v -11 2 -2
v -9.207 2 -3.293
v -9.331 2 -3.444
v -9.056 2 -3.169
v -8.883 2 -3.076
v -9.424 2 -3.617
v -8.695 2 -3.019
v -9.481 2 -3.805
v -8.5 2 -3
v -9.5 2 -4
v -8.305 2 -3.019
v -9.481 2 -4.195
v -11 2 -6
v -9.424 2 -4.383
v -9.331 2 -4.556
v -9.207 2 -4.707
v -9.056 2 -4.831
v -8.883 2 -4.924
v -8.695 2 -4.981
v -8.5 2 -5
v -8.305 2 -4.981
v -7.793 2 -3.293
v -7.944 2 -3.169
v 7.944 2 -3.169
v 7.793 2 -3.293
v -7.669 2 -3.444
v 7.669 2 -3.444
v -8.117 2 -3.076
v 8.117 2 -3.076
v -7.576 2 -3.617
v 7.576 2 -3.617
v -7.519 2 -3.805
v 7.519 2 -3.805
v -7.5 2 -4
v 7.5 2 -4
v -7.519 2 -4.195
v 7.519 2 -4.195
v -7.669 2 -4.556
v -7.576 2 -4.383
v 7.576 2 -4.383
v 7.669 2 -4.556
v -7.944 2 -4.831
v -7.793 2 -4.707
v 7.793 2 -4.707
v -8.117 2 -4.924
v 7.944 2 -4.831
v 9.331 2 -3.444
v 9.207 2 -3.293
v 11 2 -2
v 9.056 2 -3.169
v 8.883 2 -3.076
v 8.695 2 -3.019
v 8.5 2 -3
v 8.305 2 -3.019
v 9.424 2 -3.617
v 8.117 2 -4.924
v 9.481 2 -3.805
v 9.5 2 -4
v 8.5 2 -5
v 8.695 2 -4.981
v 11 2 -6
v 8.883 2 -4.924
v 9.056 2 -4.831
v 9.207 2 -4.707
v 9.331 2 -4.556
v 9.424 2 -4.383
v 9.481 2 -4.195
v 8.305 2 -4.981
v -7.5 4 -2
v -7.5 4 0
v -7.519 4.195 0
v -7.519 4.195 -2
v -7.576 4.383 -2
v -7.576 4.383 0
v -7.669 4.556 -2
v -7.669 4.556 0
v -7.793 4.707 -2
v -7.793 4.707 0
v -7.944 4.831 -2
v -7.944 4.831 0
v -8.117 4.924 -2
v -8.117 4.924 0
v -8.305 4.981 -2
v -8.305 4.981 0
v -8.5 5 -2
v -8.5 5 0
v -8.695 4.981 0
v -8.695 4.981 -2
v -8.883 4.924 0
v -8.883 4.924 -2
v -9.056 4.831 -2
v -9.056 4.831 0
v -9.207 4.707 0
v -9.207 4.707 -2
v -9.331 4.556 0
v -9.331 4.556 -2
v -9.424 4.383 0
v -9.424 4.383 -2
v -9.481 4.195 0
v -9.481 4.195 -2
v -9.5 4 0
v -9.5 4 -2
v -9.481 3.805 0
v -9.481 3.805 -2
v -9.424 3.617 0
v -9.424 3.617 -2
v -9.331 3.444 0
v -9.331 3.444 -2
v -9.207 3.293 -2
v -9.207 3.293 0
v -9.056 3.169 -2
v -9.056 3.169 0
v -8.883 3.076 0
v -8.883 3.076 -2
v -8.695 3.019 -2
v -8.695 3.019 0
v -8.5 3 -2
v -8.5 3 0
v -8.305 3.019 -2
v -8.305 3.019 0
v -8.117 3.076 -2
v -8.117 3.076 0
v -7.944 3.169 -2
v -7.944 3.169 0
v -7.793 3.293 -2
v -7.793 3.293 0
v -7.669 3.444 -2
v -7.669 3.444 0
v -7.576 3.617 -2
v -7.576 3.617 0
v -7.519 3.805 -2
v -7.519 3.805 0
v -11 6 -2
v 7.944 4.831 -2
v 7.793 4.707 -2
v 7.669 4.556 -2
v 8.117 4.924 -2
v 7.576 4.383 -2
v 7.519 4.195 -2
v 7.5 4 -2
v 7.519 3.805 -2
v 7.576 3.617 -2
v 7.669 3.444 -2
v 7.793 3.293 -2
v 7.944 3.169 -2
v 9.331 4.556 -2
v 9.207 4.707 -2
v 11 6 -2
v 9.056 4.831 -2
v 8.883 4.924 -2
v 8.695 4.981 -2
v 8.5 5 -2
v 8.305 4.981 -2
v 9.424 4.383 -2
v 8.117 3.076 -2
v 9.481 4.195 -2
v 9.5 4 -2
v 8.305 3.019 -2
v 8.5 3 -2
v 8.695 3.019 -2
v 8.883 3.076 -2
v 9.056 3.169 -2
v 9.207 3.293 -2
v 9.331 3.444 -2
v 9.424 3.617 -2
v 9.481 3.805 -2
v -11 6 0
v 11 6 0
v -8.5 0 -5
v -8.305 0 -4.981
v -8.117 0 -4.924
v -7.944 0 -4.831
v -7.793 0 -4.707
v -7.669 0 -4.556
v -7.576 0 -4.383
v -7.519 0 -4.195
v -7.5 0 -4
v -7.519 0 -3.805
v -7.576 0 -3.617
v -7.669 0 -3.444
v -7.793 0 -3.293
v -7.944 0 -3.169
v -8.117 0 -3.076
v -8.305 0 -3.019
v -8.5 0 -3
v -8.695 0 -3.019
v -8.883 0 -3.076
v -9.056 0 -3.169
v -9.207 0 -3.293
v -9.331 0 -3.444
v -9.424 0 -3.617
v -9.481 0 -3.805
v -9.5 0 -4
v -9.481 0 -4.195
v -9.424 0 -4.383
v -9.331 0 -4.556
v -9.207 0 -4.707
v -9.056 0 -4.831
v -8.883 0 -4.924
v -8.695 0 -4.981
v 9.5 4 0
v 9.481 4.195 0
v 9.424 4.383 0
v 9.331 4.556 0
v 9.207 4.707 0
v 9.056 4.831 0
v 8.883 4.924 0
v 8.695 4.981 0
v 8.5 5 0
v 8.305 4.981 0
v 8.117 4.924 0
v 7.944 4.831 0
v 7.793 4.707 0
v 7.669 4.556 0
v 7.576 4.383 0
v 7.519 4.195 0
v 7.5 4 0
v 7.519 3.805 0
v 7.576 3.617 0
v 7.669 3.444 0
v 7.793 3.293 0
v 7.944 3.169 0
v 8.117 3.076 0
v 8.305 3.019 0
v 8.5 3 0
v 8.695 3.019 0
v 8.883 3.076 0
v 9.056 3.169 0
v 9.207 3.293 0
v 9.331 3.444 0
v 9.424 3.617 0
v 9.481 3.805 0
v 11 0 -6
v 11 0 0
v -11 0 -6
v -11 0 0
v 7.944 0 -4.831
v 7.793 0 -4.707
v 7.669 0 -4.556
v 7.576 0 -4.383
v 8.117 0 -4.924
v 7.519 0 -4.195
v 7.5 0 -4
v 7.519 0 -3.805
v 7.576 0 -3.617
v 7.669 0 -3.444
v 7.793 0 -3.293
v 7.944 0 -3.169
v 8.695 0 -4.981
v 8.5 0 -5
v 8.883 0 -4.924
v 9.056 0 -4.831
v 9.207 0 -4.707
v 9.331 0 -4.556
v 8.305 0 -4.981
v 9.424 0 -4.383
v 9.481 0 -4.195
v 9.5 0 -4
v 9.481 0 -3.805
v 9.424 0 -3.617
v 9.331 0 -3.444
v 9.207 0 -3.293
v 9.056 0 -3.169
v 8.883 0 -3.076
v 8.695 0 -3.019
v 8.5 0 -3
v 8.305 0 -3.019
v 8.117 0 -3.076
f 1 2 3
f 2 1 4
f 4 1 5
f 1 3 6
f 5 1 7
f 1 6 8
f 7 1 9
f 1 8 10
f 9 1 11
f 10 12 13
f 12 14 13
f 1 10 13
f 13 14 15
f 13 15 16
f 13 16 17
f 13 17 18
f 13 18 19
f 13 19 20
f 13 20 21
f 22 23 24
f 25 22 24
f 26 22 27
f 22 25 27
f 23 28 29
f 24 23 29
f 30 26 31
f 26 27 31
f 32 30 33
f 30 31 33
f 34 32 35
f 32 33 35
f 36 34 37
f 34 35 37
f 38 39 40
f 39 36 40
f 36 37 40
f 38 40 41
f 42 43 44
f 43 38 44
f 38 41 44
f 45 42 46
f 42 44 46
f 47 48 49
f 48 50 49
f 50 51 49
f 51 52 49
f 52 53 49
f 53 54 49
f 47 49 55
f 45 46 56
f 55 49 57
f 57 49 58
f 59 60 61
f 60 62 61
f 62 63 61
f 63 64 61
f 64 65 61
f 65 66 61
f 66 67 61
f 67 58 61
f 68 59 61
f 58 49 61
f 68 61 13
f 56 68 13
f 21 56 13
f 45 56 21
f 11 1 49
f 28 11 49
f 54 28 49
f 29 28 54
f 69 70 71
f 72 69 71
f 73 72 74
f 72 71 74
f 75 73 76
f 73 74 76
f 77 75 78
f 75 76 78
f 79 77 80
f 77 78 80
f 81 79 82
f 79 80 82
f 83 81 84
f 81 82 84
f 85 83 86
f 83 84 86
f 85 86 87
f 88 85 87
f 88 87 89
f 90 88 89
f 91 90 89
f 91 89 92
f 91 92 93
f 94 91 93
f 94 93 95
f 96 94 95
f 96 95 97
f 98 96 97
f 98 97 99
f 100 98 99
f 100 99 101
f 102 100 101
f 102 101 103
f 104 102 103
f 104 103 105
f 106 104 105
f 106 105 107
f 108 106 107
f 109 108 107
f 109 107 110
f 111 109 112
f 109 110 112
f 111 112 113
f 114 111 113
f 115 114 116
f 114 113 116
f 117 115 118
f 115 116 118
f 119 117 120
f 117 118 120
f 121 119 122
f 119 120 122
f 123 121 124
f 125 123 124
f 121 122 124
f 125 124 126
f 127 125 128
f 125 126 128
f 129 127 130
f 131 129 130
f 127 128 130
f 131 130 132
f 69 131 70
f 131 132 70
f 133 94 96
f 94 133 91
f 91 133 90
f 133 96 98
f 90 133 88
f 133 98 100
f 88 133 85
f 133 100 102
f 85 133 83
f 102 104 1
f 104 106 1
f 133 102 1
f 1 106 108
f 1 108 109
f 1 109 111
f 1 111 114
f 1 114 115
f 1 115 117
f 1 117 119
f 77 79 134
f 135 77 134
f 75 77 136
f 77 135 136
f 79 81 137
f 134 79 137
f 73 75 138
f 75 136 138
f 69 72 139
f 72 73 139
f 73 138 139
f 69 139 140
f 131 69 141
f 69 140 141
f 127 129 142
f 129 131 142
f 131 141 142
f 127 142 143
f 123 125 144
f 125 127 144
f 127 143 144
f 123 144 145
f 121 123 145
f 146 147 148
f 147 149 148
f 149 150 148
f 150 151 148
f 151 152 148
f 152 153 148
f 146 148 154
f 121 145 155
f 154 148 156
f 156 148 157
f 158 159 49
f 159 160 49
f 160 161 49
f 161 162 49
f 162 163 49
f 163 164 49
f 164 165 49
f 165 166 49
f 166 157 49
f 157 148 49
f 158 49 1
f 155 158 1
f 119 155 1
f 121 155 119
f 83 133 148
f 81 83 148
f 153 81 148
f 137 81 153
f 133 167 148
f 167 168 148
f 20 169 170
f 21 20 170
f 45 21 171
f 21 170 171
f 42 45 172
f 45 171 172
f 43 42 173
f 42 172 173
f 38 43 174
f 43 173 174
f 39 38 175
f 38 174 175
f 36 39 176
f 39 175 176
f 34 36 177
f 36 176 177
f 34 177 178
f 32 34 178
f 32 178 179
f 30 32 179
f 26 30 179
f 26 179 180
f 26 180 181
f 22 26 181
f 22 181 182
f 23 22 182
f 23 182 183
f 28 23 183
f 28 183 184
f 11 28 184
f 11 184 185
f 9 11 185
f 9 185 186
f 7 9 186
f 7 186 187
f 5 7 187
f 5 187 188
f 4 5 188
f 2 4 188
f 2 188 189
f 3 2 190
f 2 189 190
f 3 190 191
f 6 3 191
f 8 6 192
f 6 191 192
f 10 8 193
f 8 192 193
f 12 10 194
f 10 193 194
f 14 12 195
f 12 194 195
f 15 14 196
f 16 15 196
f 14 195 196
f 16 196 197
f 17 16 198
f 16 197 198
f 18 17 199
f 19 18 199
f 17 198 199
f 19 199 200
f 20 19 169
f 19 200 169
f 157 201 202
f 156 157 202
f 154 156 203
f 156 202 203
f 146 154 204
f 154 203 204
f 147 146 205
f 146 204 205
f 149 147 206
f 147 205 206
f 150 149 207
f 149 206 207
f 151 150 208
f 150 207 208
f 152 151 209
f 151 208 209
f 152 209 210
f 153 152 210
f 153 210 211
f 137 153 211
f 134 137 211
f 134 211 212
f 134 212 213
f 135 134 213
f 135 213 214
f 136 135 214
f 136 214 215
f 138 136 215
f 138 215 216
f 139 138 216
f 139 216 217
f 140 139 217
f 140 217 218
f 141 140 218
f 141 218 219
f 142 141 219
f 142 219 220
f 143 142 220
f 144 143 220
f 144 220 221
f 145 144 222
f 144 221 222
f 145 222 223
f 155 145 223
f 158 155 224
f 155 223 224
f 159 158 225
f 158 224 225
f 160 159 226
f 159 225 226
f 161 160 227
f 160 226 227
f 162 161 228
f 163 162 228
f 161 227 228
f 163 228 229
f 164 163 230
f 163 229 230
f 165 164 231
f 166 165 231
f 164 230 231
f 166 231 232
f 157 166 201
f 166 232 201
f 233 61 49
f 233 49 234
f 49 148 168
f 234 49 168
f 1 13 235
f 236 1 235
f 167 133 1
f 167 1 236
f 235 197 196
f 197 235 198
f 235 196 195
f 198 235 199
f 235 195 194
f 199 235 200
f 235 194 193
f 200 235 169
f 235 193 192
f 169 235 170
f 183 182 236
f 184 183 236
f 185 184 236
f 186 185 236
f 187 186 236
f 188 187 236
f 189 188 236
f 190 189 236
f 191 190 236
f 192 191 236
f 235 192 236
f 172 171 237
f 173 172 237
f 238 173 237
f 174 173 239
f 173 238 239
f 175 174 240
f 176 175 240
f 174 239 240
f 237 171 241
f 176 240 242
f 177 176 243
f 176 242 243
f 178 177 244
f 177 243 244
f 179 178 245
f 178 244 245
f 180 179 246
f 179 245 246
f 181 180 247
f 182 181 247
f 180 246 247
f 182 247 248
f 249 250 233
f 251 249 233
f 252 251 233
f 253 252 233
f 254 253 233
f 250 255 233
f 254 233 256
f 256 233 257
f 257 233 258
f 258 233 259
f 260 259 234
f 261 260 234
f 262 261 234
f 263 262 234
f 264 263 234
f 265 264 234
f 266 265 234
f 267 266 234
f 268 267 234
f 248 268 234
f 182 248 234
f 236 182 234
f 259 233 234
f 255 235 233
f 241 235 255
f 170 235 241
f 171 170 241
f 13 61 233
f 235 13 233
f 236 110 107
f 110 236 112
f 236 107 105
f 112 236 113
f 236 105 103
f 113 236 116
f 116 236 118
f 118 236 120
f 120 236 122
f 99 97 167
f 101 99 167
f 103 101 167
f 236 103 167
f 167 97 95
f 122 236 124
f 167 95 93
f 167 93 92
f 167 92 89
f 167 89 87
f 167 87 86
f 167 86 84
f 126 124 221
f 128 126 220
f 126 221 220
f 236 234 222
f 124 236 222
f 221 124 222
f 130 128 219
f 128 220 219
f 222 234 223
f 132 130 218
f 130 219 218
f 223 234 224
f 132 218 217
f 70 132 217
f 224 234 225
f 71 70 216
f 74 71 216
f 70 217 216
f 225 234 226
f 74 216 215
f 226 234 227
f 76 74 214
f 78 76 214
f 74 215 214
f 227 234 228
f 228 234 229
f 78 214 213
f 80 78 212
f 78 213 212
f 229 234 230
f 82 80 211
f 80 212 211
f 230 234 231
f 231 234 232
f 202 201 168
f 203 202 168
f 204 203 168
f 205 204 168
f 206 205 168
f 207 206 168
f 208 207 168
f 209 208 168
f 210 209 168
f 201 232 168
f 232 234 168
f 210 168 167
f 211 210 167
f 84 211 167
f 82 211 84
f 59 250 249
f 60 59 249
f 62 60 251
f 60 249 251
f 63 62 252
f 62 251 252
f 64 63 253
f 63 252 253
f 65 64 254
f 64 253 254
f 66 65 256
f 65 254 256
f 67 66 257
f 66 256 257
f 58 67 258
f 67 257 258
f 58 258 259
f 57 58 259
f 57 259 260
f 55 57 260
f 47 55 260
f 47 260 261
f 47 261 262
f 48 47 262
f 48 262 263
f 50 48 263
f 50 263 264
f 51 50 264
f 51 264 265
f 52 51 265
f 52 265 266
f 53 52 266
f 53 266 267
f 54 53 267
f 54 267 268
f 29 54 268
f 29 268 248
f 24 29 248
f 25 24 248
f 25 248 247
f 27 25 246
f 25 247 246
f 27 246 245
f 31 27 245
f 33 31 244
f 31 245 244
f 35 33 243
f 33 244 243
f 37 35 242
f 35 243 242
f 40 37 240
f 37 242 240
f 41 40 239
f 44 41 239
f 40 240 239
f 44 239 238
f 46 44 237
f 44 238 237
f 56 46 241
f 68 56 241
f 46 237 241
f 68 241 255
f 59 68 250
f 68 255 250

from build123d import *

# Parameters (mm, degrees)
EXTRUDE_1_DEPTH     = 11
CUT_EXTRUDE_1_REACH = 15.892
SKETCH_2_R          = 1
CUT_EXTRUDE_2_REACH = 15.892
SKETCH_3_R          = 1


with BuildPart() as part:
    # 草图1 → 凸台-拉伸1 (new, symmetric)
    with BuildSketch(Plane(origin=(0, 0, 0), x_dir=(0, 0, -1), z_dir=(1, 0, 0))):
        Polygon((0, 0), (0, 6), (2, 6), (2, 2), (6, 2), (6, 0), align=None)
    extrude(amount=EXTRUDE_1_DEPTH, both=True)

    # 草图2 → 切除-拉伸1 (cut, up to next)
    with BuildSketch(Plane.XY, mode=Mode.PRIVATE) as cut_extrude_1_sk1:
        with Locations((-8.5, 4)):
            Circle(SKETCH_2_R)
    cut_extrude_1_tool1 = extrude(cut_extrude_1_sk1.sketch, amount=-CUT_EXTRUDE_1_REACH, mode=Mode.PRIVATE) & part.part
    # 草图2 → 切除-拉伸1 (cut, up to next)
    with BuildSketch(Plane.XY, mode=Mode.PRIVATE) as cut_extrude_1_sk2:
        with Locations((8.5, 4)):
            Circle(SKETCH_2_R)
    cut_extrude_1_tool2 = extrude(cut_extrude_1_sk2.sketch, amount=-CUT_EXTRUDE_1_REACH, mode=Mode.PRIVATE) & part.part
    add(cut_extrude_1_tool1.solids().sort_by_distance((-8.5, 4, 0))[0], mode=Mode.SUBTRACT)
    add(cut_extrude_1_tool2.solids().sort_by_distance((8.5, 4, 0))[0], mode=Mode.SUBTRACT)

    # 草图3 → 切除-拉伸2 (cut, up to next)
    with BuildSketch(Plane.XZ, mode=Mode.PRIVATE) as cut_extrude_2_sk1:
        with Locations(Location((-8.5, -4, 0), (0, 0, 270))):
            Circle(SKETCH_3_R)
    cut_extrude_2_tool1 = extrude(cut_extrude_2_sk1.sketch, amount=-CUT_EXTRUDE_2_REACH, mode=Mode.PRIVATE) & part.part
    # 草图3 → 切除-拉伸2 (cut, up to next)
    with BuildSketch(Plane.XZ, mode=Mode.PRIVATE) as cut_extrude_2_sk2:
        with Locations(Location((8.5, -4, 0), (0, 0, 270))):
            Circle(SKETCH_3_R)
    cut_extrude_2_tool2 = extrude(cut_extrude_2_sk2.sketch, amount=-CUT_EXTRUDE_2_REACH, mode=Mode.PRIVATE) & part.part
    add(cut_extrude_2_tool1.solids().sort_by_distance((-8.5, 0, -4))[0], mode=Mode.SUBTRACT)
    add(cut_extrude_2_tool2.solids().sort_by_distance((8.5, 0, -4))[0], mode=Mode.SUBTRACT)


solid = part.part
